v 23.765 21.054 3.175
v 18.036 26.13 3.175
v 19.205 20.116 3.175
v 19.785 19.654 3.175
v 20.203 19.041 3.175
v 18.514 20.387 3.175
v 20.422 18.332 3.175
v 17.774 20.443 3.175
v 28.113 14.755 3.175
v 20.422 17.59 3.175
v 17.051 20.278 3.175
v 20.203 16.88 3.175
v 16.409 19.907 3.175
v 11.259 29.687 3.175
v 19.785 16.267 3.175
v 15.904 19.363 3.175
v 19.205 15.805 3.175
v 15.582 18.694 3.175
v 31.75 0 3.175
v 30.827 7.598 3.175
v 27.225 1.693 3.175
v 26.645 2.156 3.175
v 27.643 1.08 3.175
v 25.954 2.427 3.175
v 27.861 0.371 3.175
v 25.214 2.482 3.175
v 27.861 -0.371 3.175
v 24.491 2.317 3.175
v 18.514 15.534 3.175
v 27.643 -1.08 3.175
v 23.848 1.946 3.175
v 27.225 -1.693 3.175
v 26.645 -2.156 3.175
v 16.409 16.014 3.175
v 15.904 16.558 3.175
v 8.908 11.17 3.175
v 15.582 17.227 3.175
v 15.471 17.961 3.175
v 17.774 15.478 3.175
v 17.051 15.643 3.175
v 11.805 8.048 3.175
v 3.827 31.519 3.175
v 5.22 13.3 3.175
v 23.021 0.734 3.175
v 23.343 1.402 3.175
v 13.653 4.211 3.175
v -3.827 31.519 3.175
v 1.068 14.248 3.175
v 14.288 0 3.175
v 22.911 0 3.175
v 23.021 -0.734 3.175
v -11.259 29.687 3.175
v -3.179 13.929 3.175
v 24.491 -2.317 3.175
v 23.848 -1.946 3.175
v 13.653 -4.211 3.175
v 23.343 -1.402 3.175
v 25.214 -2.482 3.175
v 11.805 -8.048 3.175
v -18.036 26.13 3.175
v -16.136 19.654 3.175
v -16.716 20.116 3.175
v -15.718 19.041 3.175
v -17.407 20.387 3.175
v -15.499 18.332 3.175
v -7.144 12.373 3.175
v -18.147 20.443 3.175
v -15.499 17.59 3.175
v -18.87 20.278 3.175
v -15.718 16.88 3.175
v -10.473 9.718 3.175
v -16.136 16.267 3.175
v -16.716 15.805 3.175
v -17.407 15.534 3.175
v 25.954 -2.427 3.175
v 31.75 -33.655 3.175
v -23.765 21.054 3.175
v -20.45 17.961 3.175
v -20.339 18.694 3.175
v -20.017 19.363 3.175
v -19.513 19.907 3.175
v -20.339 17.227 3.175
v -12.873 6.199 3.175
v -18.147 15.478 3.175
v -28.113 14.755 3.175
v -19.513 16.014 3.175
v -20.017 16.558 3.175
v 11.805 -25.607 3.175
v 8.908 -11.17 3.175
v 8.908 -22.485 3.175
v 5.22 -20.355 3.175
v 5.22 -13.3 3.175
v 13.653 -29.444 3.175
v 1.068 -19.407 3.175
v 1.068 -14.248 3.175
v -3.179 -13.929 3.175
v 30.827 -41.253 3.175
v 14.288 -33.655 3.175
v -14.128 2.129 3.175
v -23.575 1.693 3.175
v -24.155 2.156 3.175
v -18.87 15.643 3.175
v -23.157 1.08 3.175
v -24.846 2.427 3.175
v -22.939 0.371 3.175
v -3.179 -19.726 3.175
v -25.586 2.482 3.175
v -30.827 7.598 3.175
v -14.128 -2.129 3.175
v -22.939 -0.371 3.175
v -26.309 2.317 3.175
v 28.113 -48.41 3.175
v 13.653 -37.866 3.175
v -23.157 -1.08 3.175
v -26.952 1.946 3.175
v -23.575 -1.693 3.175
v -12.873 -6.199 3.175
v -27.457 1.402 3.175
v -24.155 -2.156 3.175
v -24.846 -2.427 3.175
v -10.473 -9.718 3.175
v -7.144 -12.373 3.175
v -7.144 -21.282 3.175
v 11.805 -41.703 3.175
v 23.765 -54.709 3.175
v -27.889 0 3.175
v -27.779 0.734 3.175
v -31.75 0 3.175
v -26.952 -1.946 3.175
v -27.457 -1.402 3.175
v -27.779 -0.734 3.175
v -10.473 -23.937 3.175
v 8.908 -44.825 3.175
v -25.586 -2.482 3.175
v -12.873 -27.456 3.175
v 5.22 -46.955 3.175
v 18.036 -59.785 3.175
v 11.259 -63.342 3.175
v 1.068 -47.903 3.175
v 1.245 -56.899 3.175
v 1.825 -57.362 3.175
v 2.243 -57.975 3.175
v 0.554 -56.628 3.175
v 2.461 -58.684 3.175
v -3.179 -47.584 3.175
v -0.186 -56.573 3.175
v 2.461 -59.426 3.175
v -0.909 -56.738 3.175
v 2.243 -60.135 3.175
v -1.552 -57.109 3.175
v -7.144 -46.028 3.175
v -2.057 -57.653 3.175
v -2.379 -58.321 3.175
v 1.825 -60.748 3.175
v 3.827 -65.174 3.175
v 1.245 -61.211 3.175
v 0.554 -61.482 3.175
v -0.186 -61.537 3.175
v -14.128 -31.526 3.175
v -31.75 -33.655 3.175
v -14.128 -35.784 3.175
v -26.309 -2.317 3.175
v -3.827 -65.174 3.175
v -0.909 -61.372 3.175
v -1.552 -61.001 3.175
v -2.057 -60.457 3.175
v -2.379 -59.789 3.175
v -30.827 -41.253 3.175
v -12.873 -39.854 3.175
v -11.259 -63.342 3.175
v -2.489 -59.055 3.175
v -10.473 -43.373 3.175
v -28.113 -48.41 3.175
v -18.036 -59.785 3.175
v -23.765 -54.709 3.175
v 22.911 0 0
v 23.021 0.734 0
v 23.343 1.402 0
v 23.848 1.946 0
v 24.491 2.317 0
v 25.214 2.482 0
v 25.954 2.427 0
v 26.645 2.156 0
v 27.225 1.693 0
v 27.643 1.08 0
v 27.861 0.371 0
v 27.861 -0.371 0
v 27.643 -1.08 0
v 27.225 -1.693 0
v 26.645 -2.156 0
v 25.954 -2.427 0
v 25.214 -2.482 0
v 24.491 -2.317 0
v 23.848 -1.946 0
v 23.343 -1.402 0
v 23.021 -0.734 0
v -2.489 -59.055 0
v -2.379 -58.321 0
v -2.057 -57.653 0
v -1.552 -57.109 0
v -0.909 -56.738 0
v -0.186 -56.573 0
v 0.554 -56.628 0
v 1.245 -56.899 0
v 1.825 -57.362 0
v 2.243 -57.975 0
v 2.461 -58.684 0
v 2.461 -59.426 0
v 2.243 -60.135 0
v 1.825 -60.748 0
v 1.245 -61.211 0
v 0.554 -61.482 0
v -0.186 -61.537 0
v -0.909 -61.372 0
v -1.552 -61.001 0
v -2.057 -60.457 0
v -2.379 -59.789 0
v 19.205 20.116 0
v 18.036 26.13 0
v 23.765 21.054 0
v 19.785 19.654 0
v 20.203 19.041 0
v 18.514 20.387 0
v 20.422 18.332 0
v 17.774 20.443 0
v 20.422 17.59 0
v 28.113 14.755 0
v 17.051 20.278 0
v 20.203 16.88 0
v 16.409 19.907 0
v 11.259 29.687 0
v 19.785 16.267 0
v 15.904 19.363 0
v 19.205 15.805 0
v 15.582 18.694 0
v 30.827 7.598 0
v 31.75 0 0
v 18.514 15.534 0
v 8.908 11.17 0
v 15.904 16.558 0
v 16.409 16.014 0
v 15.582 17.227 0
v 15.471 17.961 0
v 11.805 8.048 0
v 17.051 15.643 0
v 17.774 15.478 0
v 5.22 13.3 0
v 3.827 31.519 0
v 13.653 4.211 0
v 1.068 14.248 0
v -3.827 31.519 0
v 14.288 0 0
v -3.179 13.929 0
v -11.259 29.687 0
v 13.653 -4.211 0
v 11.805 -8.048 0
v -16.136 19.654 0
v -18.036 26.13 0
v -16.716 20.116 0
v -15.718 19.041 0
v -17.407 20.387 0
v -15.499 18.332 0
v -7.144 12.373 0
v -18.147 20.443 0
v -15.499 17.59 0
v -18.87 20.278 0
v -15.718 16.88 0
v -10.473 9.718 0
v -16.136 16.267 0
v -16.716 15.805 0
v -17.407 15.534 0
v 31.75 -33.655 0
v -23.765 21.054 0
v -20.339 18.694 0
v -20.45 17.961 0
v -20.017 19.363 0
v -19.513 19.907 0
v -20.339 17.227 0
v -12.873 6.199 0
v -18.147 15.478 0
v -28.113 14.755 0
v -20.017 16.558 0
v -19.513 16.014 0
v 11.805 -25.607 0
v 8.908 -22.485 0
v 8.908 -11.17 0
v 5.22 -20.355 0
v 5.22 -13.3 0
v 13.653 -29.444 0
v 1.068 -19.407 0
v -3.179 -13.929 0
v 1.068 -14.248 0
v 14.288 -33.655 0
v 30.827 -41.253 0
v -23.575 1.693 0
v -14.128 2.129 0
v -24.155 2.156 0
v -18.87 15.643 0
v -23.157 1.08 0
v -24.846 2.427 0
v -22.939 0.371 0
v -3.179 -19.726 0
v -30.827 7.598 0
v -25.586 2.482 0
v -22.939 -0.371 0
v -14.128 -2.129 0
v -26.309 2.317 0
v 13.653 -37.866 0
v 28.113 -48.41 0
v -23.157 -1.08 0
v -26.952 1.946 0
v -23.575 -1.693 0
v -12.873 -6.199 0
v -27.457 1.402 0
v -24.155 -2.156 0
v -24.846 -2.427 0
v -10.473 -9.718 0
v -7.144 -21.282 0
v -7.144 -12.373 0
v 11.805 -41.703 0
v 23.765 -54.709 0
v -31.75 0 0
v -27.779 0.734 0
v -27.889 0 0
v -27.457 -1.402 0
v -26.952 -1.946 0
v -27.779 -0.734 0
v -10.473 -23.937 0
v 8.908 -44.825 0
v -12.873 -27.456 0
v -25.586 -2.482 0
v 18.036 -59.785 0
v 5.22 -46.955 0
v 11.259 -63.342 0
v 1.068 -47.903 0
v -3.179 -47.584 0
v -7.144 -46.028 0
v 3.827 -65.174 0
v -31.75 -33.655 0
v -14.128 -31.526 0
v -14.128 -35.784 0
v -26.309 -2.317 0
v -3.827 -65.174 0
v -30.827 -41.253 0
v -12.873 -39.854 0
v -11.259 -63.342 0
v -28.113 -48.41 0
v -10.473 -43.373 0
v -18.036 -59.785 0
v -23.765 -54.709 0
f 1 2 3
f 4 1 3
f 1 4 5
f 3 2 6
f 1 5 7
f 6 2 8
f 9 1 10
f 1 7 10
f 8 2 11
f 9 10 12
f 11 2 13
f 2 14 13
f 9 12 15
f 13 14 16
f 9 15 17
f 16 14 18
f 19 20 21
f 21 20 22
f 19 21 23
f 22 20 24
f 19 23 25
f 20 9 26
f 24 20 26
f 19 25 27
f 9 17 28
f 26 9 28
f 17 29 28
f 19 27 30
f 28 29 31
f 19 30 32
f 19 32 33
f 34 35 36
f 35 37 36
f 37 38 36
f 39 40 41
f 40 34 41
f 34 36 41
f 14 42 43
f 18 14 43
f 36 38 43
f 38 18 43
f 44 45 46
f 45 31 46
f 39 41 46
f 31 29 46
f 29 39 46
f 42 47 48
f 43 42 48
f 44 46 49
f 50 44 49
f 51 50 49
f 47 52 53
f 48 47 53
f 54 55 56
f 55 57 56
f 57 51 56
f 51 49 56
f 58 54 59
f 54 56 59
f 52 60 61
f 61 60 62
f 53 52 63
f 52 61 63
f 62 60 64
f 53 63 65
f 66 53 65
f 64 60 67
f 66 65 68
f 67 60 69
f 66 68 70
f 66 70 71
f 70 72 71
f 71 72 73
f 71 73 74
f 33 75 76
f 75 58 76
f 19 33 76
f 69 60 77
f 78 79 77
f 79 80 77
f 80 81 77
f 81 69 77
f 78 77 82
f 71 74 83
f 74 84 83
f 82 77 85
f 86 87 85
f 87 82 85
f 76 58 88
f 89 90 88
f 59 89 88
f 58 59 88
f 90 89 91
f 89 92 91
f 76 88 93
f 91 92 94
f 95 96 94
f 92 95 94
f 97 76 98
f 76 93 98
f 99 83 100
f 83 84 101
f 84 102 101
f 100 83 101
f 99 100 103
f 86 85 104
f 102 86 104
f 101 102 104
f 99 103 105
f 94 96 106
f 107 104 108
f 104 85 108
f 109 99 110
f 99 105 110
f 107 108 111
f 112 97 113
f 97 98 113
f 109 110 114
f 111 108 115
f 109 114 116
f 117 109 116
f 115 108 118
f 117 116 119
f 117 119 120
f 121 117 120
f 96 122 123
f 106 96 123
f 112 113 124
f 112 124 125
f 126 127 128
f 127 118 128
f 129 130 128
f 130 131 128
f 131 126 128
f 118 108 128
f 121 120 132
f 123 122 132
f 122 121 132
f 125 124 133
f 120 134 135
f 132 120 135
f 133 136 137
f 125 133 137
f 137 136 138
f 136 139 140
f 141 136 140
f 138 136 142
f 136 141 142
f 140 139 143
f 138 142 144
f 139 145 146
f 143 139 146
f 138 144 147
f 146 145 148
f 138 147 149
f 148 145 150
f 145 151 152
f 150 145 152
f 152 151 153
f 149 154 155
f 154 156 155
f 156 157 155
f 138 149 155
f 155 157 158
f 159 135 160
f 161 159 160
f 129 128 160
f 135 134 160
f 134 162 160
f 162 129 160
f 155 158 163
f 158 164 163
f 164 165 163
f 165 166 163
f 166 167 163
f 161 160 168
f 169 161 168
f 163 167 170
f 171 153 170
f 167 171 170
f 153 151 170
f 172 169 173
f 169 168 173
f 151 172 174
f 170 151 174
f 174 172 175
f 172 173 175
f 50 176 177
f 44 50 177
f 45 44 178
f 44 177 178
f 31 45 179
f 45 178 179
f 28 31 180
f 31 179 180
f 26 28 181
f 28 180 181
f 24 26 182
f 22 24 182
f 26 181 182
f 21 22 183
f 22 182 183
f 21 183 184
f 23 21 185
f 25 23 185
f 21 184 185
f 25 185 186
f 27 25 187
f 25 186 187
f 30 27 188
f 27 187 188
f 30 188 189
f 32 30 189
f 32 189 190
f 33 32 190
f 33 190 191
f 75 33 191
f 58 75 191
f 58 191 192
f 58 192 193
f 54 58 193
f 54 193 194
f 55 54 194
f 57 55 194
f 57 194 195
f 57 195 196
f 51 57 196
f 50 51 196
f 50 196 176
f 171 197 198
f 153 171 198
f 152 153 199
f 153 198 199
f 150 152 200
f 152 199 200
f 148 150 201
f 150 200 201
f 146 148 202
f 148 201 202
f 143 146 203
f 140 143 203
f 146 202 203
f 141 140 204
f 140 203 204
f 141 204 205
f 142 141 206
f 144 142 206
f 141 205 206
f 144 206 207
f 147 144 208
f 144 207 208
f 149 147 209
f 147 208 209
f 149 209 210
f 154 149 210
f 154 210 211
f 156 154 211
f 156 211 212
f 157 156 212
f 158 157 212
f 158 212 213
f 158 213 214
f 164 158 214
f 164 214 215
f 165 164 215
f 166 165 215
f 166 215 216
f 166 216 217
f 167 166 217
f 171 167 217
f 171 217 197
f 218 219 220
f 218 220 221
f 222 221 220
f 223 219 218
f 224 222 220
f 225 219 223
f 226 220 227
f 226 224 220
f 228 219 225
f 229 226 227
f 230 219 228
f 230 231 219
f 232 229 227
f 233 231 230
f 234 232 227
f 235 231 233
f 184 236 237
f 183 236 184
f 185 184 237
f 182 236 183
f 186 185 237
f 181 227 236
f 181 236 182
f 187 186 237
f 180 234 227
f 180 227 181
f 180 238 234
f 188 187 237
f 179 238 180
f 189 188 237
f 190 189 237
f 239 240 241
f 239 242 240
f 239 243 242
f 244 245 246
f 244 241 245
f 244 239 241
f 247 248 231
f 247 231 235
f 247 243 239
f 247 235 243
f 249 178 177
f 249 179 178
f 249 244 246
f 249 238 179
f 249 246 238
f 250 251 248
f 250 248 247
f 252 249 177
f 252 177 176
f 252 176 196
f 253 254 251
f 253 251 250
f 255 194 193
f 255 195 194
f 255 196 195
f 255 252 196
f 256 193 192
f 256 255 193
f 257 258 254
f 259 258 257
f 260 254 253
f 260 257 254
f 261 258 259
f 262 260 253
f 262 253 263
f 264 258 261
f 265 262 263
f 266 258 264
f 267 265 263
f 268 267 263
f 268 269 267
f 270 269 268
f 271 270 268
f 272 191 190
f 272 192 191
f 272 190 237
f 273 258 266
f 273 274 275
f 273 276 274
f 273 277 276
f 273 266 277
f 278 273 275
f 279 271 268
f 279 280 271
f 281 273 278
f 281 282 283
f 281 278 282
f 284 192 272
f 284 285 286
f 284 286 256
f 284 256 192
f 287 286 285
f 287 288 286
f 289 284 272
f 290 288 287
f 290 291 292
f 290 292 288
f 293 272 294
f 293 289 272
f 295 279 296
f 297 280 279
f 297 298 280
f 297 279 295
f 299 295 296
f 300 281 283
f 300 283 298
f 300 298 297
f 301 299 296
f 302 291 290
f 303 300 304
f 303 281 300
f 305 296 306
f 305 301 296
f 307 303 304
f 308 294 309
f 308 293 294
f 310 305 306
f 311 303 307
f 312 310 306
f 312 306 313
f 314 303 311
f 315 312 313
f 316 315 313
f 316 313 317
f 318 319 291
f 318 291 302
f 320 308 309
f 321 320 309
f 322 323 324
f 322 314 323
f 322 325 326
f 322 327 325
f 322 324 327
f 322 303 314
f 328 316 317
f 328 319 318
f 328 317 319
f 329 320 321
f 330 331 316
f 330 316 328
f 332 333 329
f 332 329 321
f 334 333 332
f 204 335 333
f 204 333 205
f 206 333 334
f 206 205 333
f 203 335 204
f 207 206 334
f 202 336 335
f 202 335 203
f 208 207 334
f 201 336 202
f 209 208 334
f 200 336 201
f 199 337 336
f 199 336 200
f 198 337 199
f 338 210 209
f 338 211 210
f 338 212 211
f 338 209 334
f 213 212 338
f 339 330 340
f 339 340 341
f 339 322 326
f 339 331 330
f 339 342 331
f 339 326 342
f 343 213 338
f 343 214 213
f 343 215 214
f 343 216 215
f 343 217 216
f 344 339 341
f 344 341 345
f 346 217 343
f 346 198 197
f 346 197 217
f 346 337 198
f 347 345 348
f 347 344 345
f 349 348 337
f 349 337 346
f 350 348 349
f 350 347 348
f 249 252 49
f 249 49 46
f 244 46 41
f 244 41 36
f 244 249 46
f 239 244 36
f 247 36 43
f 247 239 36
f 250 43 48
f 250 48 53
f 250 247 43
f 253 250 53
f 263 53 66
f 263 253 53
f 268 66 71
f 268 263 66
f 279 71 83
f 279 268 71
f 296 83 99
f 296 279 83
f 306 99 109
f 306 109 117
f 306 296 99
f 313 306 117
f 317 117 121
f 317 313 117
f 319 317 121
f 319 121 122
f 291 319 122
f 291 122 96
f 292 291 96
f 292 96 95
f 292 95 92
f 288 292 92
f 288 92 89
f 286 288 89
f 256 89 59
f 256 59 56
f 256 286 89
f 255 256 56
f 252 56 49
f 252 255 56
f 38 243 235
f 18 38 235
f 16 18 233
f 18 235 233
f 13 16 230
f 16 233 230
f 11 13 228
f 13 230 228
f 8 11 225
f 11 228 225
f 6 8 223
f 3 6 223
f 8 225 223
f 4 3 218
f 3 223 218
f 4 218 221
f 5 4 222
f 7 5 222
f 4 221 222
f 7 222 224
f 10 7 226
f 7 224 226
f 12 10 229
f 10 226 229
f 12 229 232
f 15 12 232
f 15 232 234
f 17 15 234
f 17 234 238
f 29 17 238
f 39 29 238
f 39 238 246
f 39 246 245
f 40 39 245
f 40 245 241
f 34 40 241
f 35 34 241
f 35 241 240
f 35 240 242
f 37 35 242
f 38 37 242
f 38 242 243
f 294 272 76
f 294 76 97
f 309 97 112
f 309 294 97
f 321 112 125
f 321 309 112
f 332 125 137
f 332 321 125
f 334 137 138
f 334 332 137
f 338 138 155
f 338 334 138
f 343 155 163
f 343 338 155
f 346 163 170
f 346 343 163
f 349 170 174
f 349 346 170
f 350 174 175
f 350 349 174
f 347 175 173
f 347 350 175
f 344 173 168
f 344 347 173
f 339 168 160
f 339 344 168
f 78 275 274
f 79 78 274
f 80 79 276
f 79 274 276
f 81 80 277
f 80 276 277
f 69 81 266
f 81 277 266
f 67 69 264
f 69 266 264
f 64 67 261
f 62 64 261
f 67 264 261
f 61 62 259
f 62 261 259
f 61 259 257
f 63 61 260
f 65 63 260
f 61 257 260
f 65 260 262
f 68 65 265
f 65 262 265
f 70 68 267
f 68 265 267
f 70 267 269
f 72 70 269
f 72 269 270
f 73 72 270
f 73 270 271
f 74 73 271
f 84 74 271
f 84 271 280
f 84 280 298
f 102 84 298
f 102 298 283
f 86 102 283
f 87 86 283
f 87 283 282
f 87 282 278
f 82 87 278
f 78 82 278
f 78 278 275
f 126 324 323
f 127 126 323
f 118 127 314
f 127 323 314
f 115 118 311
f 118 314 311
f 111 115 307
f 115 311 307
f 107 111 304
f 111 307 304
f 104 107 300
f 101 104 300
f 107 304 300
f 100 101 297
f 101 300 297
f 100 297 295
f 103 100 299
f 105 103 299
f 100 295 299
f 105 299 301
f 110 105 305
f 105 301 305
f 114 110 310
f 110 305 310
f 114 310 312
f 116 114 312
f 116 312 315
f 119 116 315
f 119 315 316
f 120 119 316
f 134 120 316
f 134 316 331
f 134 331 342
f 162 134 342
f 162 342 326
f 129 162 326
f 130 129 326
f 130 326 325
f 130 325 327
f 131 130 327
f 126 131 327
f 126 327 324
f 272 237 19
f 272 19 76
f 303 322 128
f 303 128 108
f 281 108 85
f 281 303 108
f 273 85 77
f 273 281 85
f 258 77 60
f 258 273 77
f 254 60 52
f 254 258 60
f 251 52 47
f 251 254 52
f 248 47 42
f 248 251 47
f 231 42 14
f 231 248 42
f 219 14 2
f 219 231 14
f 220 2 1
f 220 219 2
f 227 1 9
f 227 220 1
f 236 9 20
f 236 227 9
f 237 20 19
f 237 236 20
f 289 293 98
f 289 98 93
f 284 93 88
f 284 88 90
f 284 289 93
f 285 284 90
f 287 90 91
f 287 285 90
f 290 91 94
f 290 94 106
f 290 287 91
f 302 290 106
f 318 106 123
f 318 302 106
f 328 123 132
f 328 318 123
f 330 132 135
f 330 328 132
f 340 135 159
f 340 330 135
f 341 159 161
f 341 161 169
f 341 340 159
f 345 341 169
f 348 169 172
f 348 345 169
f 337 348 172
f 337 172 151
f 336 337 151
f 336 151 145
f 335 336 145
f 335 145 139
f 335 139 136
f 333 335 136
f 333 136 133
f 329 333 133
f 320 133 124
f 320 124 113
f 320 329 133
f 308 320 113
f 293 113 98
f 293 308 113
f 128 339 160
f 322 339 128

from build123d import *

# Parameters (mm, degrees)
SKETCH1_R                  = 14.2875
BOSS_EXTRUDE1_DEPTH        = 3.175
F_9_0_196_DIAMETER_HOLE1_D = 4.9784


with BuildPart() as part:
    # Sketch1 → Boss-Extrude1 (new body)
    with BuildSketch(Plane(origin=(0, 0, 0), x_dir=(0, 1, 0), z_dir=(0, 0, 1))):
        with BuildLine():
            Line((-33.655, 31.75), (0, 31.75))
            ThreePointArc((0, 31.75), (31.75, 0), (0, -31.75))
            Line((0, -31.75), (-33.655, -31.75))
            ThreePointArc((-33.655, -31.75), (-65.405, 0), (-33.655, 31.75))
        make_face()
        with Locations(Location((0, 0, 0), (0, 0, 270))):
            Circle(SKETCH1_R, mode=Mode.SUBTRACT)
        with Locations(Location((-33.655, 0, 0), (0, 0, 270))):
            Circle(SKETCH1_R, mode=Mode.SUBTRACT)
    extrude(amount=BOSS_EXTRUDE1_DEPTH)

    # #9 (0.196) Diameter Hole1 (through all)
    with Locations(Plane.XY.offset(3.175)):
        with Locations((-58.38589225, 11.773697217), (-25.4, 0), (25.4, 0), (0, -59.055), (-17.960512242, 17.960512242), (17.960512242, 17.960512242)):
            Hole(F_9_0_196_DIAMETER_HOLE1_D / 2)


solid = part.part
